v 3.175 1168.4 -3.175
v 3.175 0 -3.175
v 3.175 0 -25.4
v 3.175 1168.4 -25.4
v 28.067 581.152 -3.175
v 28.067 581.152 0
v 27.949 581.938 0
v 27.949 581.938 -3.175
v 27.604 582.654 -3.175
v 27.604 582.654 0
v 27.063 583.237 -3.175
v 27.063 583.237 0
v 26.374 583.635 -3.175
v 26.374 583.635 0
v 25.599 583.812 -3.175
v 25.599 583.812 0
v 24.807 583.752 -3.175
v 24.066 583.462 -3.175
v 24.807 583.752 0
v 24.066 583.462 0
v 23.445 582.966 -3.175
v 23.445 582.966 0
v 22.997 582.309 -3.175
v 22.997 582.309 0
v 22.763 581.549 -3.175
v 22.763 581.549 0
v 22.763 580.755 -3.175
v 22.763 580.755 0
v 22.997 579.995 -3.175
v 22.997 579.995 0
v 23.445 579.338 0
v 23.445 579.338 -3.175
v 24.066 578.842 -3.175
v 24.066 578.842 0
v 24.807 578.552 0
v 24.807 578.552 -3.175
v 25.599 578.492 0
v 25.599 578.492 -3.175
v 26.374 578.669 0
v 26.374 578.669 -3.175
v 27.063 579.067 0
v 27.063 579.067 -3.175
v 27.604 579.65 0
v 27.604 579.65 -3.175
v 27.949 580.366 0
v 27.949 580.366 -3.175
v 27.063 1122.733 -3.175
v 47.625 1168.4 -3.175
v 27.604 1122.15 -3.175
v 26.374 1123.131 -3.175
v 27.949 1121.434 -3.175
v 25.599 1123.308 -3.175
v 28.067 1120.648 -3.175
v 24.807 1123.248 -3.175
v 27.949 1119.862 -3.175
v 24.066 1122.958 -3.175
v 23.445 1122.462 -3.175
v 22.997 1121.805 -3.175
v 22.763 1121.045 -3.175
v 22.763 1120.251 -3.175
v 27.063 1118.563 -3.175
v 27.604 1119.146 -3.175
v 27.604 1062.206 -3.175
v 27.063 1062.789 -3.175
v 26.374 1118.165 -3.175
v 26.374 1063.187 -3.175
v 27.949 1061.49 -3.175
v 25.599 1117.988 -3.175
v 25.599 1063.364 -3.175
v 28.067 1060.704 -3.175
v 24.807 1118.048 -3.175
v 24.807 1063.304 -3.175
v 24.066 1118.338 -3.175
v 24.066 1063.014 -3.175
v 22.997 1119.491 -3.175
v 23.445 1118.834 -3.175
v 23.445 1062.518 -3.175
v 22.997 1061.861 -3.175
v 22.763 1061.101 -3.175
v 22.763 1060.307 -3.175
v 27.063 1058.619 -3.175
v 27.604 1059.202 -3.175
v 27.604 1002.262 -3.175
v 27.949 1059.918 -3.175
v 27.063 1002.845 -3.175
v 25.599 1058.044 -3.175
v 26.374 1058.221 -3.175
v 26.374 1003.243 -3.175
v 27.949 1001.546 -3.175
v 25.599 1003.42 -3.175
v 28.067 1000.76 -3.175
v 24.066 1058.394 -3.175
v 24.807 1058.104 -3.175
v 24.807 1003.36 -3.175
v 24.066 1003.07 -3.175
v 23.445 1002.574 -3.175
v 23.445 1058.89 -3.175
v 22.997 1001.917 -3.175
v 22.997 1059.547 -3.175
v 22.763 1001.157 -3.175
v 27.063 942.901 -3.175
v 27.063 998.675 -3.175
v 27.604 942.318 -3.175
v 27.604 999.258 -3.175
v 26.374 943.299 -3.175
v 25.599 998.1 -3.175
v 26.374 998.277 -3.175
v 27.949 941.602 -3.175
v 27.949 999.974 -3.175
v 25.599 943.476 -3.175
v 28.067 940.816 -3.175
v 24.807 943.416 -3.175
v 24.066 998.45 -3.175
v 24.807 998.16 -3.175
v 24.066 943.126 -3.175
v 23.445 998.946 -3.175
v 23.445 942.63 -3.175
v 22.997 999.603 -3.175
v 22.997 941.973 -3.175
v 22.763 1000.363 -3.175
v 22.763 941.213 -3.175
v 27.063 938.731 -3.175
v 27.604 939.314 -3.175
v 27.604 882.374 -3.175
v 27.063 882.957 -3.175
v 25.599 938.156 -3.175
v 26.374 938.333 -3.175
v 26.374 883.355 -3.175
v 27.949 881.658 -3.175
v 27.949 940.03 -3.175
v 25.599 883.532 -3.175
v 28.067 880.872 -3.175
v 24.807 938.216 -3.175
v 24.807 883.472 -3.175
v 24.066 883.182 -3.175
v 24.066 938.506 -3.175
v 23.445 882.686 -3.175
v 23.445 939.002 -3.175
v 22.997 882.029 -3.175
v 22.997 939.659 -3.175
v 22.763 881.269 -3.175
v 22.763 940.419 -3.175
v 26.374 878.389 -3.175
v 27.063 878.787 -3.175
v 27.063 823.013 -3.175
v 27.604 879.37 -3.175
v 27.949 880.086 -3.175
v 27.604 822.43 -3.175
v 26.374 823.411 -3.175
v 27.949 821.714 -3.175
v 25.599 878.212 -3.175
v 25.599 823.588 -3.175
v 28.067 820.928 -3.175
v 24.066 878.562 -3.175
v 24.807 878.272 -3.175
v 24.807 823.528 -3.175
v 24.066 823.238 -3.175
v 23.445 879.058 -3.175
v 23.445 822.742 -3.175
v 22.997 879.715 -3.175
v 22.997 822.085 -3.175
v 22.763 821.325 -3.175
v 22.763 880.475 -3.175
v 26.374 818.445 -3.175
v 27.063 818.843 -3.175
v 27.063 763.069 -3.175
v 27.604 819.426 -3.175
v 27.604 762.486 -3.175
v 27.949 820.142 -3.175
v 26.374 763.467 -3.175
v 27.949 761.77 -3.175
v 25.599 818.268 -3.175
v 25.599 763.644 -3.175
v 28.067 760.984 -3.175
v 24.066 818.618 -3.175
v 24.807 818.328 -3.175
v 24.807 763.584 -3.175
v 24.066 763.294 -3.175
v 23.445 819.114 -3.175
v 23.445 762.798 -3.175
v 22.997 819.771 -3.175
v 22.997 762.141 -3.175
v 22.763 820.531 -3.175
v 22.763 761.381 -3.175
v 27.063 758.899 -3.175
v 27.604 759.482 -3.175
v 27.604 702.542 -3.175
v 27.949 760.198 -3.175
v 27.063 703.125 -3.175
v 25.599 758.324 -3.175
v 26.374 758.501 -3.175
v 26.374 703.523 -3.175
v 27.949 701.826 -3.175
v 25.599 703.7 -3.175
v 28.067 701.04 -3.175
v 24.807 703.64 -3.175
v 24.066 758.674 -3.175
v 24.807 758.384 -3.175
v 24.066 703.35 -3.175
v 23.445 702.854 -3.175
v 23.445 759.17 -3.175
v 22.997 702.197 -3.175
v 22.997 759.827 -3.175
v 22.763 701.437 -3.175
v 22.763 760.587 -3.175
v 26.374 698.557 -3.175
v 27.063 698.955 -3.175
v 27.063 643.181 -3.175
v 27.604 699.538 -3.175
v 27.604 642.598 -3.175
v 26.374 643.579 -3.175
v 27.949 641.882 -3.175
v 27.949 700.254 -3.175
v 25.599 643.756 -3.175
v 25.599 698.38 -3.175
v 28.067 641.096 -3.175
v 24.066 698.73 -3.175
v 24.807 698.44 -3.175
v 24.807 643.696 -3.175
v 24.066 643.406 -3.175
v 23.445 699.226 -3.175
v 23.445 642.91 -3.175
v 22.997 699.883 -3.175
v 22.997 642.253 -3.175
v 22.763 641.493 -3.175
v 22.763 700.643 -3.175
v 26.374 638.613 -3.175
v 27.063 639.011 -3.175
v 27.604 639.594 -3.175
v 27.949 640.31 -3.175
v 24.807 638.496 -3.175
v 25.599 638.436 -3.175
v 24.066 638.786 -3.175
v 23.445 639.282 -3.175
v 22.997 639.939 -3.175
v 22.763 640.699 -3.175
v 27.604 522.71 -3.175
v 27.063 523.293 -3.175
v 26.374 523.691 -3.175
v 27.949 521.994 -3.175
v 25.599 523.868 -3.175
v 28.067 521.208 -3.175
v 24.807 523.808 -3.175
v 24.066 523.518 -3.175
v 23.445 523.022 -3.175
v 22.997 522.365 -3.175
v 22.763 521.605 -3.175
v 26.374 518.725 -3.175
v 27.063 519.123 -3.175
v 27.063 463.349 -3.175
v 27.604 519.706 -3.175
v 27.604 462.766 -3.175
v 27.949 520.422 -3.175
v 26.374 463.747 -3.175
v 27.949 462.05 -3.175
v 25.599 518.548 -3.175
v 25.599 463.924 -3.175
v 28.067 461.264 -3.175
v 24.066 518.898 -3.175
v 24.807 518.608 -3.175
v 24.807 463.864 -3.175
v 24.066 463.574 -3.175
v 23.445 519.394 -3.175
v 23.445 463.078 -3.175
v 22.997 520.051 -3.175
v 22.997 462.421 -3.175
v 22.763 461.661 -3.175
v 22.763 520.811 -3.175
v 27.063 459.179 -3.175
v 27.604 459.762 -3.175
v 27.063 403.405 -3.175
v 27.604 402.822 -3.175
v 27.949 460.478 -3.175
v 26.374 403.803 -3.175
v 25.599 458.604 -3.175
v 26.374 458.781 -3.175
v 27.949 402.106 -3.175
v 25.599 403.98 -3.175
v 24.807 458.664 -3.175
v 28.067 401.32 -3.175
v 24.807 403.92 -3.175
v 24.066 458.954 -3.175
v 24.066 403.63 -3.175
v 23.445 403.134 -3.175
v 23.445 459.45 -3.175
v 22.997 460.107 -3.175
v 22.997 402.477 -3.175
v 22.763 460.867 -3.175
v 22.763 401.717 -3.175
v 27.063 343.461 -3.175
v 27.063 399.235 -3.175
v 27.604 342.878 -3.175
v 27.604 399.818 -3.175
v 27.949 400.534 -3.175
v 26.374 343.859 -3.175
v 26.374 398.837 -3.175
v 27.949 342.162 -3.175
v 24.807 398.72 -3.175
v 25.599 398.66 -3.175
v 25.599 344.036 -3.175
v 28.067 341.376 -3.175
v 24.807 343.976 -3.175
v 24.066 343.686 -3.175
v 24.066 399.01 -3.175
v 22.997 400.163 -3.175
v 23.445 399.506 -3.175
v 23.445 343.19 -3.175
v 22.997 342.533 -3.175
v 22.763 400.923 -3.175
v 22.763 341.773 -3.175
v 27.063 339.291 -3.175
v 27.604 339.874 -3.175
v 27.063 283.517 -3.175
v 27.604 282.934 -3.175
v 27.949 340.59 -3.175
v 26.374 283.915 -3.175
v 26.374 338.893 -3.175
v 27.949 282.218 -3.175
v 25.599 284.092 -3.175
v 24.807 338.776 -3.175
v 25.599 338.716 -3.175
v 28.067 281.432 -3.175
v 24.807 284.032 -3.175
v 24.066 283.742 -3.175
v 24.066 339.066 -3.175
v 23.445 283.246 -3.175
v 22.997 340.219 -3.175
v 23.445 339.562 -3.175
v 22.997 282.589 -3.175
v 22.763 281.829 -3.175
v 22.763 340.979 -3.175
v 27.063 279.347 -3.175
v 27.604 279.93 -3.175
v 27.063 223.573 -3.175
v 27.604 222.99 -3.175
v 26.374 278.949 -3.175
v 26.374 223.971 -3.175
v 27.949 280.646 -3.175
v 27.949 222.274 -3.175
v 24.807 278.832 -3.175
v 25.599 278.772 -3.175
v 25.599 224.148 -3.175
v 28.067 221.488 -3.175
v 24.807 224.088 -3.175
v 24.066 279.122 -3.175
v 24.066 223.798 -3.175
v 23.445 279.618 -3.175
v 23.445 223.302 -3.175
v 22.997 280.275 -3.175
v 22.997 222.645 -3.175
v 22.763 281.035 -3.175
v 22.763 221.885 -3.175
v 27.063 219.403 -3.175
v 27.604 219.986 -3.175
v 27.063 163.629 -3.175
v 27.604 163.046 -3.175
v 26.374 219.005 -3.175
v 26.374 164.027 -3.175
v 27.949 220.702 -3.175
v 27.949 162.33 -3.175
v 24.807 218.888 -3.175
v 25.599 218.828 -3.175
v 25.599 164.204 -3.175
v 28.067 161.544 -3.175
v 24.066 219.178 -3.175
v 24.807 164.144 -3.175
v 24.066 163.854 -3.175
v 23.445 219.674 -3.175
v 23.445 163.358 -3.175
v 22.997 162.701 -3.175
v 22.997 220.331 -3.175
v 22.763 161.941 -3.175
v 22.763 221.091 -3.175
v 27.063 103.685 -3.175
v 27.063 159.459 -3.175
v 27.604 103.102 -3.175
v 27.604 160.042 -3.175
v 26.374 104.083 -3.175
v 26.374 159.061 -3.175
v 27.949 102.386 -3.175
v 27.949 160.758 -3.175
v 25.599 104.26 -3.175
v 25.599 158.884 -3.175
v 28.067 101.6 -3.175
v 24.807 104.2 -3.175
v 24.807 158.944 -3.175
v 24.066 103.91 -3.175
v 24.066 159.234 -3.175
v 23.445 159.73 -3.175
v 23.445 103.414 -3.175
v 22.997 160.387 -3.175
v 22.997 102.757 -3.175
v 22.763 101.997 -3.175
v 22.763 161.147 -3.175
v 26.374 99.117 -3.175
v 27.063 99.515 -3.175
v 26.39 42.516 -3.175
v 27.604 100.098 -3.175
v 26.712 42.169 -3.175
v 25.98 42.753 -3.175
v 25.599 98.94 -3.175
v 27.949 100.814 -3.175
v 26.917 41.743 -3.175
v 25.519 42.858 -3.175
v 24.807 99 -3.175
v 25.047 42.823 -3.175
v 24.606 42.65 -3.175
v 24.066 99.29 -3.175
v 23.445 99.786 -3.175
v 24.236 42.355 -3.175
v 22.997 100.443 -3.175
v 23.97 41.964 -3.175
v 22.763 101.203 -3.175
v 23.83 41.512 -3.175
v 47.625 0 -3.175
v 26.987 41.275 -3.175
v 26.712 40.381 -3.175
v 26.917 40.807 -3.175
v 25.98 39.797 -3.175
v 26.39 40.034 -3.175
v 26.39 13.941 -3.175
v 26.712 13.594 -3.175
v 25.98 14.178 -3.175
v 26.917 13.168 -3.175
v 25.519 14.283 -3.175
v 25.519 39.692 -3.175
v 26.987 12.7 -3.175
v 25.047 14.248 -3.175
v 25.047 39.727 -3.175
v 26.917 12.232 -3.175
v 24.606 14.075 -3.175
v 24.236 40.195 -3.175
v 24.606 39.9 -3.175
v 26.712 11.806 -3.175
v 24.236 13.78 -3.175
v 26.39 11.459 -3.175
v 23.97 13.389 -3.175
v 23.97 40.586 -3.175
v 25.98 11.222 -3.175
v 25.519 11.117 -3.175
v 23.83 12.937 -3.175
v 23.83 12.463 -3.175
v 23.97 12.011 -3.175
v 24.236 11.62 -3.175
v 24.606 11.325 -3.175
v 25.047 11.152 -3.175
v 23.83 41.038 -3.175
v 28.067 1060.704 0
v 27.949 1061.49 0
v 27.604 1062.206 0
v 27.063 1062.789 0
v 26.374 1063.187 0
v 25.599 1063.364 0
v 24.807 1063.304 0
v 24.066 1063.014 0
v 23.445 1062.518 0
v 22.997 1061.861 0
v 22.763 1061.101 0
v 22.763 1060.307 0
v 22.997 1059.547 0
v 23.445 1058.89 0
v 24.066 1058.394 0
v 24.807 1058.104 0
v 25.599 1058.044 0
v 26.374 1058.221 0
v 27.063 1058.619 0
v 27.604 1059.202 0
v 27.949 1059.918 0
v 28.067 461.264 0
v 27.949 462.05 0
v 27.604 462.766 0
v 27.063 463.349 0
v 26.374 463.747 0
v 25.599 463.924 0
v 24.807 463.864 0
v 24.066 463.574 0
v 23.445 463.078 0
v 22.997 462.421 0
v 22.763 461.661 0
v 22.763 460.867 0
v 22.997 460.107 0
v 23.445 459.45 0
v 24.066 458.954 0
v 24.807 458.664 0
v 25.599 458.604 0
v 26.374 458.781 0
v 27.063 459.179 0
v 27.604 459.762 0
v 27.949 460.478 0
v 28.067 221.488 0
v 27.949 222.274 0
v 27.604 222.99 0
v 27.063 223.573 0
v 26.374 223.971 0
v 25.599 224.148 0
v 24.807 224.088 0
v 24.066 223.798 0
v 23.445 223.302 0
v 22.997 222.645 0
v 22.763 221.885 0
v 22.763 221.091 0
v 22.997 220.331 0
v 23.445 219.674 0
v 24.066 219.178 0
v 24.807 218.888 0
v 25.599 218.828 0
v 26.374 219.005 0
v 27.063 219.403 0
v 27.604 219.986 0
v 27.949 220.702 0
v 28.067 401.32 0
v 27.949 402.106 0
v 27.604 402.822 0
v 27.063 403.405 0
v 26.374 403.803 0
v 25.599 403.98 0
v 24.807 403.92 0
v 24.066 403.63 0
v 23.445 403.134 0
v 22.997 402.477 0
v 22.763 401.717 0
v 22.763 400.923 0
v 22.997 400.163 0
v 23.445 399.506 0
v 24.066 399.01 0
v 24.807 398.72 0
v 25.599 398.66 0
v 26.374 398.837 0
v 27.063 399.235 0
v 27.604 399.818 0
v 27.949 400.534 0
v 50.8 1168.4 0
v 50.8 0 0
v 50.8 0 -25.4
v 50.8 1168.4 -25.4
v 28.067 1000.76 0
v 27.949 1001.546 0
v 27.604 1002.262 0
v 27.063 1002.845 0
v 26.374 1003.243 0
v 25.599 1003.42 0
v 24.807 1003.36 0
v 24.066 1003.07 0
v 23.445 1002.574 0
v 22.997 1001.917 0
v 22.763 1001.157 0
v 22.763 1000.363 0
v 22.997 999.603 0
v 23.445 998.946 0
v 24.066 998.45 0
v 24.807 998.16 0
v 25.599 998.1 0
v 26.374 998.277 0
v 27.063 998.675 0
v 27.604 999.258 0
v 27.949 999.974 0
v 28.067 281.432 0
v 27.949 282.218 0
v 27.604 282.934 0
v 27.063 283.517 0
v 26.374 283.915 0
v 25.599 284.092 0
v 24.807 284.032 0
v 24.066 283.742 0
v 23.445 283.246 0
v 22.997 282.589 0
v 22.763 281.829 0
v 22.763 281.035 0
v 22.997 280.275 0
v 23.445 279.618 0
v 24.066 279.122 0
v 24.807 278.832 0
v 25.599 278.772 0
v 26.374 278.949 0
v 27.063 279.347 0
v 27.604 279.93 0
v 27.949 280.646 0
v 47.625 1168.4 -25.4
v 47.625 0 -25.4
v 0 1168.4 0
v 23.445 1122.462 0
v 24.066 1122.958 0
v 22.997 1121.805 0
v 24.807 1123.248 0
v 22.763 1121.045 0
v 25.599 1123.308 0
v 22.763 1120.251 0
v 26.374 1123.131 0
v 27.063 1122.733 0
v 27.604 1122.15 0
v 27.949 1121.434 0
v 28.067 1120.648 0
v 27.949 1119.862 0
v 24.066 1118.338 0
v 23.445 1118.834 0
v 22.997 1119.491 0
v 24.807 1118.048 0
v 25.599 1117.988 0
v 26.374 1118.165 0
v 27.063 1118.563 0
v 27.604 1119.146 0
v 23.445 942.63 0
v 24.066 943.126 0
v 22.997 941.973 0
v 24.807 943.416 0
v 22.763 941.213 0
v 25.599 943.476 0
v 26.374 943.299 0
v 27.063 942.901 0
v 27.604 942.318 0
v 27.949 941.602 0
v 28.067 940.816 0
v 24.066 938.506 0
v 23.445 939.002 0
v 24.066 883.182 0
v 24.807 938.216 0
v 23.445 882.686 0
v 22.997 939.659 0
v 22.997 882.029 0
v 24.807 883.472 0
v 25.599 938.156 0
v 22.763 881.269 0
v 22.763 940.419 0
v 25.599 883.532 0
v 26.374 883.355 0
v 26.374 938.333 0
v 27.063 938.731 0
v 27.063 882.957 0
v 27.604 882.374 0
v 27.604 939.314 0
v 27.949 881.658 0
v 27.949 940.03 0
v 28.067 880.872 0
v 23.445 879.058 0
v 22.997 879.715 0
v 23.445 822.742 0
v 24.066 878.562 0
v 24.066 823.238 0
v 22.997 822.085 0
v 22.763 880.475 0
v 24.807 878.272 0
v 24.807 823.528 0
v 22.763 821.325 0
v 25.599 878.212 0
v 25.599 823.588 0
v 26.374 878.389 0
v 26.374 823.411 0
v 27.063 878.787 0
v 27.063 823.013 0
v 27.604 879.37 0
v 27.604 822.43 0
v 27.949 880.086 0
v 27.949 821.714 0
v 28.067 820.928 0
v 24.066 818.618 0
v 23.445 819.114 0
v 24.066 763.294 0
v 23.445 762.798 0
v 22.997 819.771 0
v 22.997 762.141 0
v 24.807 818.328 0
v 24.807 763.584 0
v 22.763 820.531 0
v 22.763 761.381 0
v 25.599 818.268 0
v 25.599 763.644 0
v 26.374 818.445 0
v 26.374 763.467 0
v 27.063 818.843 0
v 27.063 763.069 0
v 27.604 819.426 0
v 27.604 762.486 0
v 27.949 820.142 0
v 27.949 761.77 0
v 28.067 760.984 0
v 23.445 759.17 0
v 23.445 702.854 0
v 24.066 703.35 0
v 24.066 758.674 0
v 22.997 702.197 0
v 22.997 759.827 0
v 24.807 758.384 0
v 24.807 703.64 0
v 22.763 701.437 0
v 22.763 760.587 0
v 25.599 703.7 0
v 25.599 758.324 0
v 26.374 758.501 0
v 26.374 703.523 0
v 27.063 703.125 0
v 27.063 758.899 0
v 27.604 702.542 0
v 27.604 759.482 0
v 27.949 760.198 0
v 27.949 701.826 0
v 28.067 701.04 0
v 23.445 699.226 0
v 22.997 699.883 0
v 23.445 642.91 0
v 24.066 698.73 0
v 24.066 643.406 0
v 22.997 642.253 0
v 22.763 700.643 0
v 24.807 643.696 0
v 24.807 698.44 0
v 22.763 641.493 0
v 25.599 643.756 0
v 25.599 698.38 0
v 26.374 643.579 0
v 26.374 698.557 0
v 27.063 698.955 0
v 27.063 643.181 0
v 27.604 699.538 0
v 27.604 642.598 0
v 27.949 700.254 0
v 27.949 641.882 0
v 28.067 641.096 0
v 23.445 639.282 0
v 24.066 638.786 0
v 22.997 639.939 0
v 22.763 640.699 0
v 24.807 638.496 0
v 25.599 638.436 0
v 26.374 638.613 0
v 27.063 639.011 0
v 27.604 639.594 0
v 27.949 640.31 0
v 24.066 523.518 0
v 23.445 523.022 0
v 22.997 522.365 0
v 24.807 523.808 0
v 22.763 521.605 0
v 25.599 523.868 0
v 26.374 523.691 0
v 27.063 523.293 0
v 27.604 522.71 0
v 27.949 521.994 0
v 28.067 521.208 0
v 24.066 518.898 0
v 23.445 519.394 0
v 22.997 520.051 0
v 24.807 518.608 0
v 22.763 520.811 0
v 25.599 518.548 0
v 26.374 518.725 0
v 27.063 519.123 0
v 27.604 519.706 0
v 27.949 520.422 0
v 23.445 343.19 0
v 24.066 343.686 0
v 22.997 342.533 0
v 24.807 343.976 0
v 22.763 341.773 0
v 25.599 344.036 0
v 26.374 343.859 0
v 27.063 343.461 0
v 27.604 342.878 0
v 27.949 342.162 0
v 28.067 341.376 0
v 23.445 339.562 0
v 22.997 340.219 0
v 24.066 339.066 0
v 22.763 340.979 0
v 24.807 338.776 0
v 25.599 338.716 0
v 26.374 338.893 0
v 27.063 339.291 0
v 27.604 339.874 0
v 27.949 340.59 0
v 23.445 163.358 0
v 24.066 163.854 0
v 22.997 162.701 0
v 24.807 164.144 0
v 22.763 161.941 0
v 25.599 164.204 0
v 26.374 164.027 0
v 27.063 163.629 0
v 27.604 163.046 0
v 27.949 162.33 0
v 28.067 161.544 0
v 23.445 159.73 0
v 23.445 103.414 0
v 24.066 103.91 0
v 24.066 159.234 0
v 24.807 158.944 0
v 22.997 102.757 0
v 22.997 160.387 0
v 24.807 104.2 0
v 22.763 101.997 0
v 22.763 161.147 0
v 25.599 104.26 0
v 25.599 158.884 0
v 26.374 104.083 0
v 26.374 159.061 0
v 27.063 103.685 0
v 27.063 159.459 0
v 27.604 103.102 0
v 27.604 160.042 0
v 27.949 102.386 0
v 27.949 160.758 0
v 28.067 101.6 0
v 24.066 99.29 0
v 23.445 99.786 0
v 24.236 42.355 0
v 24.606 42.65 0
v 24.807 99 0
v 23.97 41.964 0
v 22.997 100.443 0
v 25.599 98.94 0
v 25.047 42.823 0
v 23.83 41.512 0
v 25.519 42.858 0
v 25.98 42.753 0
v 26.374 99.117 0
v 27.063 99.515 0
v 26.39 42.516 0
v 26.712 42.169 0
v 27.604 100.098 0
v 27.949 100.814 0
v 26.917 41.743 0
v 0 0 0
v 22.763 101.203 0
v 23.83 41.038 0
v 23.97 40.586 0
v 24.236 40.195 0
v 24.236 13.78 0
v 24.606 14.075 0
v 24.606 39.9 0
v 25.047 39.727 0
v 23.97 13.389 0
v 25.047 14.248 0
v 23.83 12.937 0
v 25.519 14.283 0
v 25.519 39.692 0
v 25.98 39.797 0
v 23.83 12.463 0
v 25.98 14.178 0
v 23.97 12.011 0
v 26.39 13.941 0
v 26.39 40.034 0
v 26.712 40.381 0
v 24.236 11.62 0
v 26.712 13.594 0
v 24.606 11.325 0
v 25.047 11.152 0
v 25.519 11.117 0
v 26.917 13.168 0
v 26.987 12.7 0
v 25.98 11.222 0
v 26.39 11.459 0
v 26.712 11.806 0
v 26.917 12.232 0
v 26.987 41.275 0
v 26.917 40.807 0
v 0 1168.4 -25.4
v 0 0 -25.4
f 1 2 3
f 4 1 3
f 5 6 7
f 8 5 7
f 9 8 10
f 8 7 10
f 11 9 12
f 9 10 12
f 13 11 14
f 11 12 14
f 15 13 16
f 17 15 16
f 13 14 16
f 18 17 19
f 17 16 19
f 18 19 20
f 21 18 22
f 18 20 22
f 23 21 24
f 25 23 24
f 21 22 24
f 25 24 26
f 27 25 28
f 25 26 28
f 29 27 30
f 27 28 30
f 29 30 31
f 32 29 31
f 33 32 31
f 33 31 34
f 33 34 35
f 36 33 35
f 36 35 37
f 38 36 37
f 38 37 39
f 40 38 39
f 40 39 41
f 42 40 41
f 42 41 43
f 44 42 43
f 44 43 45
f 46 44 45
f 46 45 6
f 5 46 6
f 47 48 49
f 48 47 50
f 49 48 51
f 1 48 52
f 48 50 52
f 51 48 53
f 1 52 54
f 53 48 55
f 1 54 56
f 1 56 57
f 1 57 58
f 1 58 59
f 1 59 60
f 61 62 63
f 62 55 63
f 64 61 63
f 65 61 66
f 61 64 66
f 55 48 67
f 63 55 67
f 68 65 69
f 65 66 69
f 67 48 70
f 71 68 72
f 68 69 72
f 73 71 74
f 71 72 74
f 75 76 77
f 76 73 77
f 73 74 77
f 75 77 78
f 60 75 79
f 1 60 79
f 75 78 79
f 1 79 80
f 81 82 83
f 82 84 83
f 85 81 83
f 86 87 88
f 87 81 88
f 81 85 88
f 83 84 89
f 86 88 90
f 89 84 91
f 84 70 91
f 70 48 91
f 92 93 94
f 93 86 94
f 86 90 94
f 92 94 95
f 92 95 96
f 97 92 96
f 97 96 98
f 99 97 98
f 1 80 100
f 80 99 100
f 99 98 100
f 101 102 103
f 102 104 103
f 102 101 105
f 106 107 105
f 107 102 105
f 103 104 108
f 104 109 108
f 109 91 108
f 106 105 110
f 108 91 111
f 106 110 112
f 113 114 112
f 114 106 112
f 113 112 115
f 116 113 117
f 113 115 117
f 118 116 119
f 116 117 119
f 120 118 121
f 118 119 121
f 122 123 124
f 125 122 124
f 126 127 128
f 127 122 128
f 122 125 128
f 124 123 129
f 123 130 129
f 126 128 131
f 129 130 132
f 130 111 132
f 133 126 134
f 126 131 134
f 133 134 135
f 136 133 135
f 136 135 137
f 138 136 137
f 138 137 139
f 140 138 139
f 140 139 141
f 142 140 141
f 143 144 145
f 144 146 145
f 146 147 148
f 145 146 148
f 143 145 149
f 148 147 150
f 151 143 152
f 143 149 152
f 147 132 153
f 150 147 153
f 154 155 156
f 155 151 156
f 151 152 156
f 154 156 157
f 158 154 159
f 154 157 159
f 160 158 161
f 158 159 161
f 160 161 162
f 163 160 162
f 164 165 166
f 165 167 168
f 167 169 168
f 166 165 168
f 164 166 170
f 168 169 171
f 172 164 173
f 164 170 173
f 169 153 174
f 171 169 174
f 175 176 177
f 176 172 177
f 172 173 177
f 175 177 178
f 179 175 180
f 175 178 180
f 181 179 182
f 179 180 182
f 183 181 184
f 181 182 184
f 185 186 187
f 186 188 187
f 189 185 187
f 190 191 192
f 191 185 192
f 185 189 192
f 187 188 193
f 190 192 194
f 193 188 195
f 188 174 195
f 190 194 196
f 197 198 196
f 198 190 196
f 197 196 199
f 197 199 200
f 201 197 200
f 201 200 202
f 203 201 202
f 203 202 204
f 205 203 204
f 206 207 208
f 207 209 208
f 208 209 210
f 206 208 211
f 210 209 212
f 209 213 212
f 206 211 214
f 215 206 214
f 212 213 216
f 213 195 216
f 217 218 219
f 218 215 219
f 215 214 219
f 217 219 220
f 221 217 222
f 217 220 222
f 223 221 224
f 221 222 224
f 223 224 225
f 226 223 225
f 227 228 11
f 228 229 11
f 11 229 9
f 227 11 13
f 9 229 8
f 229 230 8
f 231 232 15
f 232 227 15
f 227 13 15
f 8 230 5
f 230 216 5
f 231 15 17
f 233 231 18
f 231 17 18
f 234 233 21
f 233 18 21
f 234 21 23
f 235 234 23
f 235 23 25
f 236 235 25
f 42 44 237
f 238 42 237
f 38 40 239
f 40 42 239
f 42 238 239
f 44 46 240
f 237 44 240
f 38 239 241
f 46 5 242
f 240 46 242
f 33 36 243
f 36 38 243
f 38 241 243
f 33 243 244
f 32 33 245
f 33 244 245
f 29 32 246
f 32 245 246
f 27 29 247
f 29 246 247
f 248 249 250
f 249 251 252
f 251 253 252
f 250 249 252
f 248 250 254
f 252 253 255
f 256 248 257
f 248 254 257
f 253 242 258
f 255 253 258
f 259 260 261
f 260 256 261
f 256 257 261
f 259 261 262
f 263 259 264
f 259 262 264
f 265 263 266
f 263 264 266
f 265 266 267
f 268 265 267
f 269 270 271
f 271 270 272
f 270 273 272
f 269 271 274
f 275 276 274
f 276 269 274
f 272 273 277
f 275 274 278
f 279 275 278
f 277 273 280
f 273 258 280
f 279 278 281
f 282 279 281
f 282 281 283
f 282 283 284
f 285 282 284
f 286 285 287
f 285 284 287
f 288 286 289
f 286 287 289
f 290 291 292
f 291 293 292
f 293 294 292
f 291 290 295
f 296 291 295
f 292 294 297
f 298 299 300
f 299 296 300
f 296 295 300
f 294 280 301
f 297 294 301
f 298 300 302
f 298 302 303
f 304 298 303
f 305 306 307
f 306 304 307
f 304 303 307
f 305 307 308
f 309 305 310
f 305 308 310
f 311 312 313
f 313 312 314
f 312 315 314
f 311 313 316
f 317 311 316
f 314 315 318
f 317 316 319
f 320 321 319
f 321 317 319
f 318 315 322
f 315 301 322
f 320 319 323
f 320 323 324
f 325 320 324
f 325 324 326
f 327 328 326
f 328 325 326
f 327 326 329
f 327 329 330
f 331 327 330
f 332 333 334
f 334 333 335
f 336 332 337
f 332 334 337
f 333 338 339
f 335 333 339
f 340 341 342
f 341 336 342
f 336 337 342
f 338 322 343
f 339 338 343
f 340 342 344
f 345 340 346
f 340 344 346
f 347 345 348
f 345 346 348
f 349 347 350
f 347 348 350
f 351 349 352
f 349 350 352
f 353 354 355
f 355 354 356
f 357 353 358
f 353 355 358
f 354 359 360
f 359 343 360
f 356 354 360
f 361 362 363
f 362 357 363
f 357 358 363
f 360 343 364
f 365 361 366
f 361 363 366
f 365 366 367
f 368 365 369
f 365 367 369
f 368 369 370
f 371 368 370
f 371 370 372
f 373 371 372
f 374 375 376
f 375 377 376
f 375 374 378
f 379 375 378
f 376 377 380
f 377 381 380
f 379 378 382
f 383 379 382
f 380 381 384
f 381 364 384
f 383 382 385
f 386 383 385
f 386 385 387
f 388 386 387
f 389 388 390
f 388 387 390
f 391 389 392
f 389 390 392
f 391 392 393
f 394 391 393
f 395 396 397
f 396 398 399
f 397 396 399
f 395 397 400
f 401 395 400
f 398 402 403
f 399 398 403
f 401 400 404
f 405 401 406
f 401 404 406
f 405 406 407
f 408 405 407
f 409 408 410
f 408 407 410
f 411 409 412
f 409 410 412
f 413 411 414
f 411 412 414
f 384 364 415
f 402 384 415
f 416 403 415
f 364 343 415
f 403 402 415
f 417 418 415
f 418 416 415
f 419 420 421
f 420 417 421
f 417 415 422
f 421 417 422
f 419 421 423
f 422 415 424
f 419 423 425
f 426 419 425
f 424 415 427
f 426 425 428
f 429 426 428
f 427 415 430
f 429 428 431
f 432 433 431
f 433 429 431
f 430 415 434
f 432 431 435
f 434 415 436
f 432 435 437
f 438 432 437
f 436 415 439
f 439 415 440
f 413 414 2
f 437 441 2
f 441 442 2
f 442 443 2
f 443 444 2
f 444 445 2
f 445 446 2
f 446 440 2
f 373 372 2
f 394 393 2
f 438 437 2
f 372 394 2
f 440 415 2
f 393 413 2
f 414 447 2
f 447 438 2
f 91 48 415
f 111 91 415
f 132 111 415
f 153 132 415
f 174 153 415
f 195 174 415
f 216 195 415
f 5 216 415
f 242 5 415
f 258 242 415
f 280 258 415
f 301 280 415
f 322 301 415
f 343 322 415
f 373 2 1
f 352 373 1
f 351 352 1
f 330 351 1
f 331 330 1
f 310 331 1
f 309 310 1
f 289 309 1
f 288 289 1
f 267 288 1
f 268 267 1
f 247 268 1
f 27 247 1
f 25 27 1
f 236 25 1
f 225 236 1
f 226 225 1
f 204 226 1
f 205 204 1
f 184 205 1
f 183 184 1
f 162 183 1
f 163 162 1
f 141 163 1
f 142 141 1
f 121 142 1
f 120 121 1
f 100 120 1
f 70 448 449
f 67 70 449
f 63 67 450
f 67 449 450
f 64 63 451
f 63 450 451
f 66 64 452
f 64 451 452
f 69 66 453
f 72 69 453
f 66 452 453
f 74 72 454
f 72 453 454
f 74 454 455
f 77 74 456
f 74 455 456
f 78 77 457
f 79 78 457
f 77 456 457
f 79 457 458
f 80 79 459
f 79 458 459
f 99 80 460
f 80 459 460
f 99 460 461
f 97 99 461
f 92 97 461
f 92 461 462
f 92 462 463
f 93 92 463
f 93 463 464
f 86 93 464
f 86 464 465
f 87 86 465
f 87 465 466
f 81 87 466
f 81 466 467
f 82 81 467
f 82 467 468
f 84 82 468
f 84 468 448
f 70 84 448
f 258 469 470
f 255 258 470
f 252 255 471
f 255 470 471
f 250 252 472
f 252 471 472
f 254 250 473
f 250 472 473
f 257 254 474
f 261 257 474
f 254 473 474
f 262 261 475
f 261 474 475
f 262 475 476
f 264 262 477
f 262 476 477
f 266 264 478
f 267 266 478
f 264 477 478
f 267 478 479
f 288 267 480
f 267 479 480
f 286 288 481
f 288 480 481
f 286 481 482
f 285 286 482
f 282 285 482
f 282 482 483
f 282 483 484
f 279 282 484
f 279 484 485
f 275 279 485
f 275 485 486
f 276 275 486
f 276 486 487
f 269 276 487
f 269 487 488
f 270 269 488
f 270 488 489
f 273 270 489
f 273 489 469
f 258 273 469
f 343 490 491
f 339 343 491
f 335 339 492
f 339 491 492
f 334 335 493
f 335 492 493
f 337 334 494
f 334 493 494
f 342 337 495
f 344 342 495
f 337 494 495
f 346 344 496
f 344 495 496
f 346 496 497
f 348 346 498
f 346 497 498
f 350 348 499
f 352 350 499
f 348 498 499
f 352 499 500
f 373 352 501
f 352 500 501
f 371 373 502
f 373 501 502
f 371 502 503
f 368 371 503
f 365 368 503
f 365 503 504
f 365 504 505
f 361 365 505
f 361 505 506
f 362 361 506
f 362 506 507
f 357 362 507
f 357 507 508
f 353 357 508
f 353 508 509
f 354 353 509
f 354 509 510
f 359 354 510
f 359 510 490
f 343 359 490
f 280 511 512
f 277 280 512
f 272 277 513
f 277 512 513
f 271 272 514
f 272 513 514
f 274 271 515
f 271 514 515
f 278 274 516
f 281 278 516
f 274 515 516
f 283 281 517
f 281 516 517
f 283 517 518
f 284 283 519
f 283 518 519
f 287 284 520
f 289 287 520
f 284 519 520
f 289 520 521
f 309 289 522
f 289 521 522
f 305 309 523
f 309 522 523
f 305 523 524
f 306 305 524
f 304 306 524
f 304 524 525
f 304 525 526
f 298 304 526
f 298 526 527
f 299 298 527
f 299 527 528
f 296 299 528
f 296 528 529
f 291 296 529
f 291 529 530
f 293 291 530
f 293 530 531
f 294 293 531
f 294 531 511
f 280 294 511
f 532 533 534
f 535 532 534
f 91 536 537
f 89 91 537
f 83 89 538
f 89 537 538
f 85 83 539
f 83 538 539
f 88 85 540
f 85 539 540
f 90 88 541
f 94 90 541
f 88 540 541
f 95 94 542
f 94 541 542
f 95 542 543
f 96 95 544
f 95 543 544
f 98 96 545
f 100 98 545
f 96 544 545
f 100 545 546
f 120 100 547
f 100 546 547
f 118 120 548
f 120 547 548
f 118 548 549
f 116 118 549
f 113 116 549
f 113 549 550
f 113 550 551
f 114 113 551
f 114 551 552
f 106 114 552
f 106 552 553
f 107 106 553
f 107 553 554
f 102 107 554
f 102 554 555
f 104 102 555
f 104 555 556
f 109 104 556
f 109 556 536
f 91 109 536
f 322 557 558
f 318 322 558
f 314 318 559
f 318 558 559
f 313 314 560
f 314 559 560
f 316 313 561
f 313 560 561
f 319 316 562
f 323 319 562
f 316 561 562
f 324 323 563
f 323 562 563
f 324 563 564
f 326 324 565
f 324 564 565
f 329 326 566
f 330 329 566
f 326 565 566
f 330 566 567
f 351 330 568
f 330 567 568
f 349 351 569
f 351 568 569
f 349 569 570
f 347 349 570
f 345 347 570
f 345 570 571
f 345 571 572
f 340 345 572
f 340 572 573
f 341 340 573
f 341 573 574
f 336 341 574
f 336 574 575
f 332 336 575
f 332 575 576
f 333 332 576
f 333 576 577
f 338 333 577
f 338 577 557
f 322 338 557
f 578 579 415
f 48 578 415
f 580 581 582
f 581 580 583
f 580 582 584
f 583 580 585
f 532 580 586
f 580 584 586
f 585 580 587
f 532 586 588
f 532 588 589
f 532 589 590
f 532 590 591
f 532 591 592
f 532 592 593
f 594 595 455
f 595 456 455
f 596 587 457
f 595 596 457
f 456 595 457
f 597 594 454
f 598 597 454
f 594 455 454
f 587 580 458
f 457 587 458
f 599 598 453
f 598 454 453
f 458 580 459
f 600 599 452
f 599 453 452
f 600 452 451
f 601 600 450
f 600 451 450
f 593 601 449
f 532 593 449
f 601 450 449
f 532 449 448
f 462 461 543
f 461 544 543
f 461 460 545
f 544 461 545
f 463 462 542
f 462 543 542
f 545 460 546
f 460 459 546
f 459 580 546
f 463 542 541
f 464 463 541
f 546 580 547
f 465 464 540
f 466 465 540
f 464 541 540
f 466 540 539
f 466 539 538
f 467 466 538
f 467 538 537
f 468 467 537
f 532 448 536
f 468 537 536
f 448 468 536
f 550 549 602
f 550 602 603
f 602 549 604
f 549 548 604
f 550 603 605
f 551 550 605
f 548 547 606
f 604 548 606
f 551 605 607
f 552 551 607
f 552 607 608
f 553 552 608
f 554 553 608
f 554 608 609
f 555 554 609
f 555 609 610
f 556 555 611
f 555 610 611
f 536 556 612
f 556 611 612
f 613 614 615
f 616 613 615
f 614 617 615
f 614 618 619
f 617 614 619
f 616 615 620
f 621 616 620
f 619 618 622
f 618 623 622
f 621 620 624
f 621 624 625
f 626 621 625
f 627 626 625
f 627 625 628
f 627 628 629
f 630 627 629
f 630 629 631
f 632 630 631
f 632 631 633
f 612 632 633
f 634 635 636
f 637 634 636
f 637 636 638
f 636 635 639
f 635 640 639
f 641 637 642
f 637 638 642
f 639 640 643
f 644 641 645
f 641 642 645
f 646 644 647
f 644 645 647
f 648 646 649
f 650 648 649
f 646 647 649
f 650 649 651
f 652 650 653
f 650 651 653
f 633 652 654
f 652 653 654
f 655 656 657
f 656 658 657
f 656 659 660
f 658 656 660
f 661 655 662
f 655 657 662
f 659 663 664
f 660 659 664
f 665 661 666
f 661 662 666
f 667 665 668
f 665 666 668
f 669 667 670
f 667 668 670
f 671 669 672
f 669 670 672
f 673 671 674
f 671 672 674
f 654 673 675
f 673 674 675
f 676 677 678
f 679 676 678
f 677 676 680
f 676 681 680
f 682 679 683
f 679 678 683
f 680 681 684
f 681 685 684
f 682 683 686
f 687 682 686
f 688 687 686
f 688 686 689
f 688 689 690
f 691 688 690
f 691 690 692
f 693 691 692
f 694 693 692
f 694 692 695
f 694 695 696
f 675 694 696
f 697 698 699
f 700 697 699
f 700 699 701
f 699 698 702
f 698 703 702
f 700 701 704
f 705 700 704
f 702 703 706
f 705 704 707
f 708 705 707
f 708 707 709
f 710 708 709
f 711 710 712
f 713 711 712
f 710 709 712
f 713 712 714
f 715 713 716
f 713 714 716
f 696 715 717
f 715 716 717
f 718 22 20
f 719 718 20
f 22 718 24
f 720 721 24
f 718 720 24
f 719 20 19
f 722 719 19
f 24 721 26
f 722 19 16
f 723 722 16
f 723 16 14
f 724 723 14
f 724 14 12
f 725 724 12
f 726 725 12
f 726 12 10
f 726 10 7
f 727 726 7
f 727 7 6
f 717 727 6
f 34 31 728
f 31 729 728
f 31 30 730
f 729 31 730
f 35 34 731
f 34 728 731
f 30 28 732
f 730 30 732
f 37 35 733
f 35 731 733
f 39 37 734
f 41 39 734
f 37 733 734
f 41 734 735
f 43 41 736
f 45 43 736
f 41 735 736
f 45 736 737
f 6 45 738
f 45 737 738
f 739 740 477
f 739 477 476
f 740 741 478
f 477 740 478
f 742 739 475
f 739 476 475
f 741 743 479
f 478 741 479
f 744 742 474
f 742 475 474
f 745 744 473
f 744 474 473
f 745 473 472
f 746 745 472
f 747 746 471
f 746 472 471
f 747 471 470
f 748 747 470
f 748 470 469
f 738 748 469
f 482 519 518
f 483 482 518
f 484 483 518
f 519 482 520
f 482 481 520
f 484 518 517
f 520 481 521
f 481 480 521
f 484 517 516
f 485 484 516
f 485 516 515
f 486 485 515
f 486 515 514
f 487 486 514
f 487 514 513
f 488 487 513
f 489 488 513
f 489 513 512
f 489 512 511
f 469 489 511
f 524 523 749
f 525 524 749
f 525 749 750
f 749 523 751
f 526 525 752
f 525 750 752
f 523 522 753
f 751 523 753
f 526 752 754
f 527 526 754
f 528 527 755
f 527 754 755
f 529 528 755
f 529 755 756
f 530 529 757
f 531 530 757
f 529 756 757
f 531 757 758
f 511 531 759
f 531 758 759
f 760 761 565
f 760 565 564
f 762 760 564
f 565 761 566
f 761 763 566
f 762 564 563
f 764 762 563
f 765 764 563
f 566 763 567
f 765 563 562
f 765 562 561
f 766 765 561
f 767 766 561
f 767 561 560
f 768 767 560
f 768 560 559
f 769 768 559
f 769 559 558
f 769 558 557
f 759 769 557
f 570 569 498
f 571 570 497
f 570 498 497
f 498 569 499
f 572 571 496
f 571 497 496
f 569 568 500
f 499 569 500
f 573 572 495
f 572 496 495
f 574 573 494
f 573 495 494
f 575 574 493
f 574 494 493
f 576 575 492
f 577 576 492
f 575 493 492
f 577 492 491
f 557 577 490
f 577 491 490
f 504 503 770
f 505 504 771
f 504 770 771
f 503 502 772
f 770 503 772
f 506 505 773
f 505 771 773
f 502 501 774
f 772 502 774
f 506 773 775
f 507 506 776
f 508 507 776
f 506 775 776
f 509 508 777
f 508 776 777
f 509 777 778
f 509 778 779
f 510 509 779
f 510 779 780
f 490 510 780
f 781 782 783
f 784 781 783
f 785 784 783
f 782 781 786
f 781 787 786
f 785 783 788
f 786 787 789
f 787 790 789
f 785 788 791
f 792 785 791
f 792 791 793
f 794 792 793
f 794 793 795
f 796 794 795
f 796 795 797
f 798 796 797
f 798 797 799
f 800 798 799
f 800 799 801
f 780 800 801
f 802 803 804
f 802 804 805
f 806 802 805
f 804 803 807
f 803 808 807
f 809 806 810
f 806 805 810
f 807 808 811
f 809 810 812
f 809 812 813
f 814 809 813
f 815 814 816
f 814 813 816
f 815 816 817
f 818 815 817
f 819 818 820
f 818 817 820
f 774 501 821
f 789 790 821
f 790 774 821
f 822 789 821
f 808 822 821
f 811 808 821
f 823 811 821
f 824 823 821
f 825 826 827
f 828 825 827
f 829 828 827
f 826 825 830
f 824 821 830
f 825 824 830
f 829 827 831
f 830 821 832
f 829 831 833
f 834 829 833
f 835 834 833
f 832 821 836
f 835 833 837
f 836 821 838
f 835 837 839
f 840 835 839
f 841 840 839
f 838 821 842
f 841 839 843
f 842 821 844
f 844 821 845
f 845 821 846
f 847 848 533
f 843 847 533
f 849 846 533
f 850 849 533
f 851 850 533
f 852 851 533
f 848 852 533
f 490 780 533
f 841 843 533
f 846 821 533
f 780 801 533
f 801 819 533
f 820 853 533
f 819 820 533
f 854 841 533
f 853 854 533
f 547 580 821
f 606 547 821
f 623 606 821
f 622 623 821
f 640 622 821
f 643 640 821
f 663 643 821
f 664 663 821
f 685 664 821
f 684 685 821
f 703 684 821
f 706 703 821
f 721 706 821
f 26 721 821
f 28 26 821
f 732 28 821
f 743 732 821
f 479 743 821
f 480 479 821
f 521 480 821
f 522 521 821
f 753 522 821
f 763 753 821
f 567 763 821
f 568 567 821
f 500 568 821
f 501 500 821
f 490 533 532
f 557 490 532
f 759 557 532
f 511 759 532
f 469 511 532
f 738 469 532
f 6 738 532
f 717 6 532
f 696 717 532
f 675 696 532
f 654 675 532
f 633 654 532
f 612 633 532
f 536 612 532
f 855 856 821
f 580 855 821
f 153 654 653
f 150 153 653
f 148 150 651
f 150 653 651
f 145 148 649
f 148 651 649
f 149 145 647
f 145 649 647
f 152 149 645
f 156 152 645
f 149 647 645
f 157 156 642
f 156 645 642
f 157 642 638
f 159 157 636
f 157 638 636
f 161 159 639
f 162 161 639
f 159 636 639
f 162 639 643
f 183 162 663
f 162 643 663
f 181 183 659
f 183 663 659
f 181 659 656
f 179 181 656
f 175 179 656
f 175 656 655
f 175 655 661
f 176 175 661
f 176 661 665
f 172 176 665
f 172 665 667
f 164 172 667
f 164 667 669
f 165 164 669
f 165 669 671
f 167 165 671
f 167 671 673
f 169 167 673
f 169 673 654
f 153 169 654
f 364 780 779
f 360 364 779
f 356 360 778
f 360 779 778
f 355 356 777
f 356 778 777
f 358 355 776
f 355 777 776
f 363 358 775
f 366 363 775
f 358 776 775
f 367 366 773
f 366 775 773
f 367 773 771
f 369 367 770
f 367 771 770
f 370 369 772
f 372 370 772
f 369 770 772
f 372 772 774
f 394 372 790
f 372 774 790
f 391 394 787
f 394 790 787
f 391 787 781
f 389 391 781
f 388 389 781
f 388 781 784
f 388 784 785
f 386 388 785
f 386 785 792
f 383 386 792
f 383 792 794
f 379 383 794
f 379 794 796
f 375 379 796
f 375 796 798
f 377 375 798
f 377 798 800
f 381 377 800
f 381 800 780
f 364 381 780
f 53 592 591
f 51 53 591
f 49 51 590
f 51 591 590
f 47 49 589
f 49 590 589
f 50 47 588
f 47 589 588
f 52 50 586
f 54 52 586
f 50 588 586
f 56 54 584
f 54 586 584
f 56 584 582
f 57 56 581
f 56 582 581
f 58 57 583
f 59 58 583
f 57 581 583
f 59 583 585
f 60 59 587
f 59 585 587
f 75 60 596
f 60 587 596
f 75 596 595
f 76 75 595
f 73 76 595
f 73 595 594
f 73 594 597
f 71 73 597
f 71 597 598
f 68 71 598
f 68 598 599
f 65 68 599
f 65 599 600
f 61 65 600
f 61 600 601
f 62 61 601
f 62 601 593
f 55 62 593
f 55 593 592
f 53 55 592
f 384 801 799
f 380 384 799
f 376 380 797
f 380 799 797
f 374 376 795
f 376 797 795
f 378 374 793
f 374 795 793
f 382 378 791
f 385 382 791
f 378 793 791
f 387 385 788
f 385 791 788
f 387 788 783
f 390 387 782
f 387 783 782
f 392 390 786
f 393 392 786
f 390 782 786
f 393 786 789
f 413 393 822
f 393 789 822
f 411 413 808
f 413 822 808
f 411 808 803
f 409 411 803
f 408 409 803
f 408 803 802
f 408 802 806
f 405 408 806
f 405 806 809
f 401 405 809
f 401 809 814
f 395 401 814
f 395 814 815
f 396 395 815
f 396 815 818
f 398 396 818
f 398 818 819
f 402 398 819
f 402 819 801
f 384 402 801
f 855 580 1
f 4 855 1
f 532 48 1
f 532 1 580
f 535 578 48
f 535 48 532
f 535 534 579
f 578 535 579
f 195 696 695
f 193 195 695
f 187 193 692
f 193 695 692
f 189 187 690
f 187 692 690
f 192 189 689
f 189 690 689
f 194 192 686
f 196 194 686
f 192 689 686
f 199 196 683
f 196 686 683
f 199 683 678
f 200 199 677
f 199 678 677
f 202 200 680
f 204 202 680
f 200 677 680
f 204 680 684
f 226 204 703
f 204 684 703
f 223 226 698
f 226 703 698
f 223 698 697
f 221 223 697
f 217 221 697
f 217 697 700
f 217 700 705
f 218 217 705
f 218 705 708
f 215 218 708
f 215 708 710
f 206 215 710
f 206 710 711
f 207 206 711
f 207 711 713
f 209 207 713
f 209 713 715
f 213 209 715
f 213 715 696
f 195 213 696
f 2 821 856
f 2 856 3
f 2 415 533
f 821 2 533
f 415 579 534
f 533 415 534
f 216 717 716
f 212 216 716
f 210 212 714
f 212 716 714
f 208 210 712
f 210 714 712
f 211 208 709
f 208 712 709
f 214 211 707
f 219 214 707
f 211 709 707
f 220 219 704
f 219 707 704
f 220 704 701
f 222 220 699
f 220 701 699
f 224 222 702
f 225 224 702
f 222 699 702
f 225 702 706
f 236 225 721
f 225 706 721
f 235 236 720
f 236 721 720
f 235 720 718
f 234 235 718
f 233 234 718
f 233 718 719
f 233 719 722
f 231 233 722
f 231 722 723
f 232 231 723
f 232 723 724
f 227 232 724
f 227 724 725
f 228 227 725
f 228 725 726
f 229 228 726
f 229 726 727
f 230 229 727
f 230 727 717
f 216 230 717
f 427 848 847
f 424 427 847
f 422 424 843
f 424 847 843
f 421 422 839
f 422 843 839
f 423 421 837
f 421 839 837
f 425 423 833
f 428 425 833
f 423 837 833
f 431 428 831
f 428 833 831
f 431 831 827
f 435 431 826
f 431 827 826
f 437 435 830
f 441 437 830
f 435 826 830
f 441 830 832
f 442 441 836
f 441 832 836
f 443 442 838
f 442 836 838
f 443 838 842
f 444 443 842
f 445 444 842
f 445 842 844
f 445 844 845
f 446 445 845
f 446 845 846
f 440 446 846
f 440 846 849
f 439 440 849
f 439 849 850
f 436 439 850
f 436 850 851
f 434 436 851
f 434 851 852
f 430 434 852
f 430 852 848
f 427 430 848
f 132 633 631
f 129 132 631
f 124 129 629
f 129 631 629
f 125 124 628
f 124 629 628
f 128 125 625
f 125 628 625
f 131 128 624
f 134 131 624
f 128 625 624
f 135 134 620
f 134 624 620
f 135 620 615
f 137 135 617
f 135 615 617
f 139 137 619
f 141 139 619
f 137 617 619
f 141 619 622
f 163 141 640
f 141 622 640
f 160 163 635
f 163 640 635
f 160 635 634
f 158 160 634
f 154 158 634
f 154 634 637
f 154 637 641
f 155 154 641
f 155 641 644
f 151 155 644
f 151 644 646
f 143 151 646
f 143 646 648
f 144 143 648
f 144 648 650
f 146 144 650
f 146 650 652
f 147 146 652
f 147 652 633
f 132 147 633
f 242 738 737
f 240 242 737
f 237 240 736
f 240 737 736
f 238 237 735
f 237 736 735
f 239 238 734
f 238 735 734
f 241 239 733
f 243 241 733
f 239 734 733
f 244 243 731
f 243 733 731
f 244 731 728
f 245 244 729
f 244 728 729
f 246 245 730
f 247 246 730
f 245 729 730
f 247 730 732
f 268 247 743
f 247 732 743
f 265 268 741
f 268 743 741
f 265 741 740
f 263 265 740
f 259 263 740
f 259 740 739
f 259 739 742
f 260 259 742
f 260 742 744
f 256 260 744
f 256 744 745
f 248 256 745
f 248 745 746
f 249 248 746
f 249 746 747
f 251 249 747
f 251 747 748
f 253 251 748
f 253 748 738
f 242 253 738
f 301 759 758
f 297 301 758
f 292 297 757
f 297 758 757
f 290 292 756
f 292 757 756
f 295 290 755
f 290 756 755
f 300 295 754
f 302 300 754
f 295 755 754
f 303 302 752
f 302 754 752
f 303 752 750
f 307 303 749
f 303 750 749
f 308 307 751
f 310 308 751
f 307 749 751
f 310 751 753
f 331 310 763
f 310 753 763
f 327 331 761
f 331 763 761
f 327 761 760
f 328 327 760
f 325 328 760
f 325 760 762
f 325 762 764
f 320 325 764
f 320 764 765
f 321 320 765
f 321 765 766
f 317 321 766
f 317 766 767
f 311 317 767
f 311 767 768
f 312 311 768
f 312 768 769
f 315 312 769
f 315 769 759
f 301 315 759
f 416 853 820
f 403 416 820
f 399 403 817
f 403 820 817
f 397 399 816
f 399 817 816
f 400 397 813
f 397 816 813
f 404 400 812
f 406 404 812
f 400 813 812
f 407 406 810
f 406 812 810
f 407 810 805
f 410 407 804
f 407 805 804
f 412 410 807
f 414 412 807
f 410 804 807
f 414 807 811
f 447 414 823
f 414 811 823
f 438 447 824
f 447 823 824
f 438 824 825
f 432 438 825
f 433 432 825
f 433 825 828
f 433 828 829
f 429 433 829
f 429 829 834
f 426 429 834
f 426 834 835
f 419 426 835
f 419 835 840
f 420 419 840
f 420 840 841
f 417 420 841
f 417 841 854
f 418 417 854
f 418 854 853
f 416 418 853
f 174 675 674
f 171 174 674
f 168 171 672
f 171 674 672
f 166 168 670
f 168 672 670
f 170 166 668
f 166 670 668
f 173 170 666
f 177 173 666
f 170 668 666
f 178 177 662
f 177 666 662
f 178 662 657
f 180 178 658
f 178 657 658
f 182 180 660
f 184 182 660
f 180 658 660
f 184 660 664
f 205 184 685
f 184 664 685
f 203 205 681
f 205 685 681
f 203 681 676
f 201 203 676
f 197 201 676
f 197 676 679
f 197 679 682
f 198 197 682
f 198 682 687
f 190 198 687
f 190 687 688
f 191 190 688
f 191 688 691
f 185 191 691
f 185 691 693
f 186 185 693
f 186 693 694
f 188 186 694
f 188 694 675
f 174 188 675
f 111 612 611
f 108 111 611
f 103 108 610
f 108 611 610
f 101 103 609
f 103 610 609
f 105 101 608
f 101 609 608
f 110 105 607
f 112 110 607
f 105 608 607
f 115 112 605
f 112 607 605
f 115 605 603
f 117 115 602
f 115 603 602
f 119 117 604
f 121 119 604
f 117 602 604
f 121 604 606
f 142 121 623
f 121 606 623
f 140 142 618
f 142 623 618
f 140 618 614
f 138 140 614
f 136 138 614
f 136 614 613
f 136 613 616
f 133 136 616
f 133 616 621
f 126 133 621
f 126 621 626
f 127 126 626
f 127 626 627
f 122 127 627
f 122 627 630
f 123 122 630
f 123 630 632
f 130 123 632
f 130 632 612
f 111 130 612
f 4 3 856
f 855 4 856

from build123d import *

# Parameters (mm, degrees)
BOSS_EXTRUDE1_DEPTH = 1168.4
CUT_EXTRUDE1_REACH  = 27.4
SKETCH2_R           = 2.667
CUT_EXTRUDE2_REACH  = 27.4
SKETCH4_R           = 1.5875


with BuildPart() as part:
    # Sketch1 → Boss-Extrude1 (new body)
    with BuildSketch(Plane(origin=(0, 0, 0), x_dir=(1, 0, 0), z_dir=(0, 1, 0))):
        Polygon((3.175, 3.175), (3.175, 25.4), (0, 25.4), (0, 0), (50.8, 0), (50.8, 25.4), (47.625, 25.4), (47.625, 3.175), align=None)
    extrude(amount=BOSS_EXTRUDE1_DEPTH)

    # Sketch2 → Cut-Extrude1 (cut, up to next)
    with BuildSketch(Plane.XY, mode=Mode.PRIVATE) as cut_extrude1_sk1:
        with Locations((25.4, 101.6)):
            Circle(SKETCH2_R)
    cut_extrude1_tool1 = extrude(cut_extrude1_sk1.sketch, amount=-CUT_EXTRUDE1_REACH, mode=Mode.PRIVATE) & part.part
    add(cut_extrude1_tool1.solids().sort_by_distance((25.4, 101.6, 0))[0], mode=Mode.SUBTRACT)
    # Sketch2 → Cut-Extrude1 (cut, up to next)
    with BuildSketch(Plane.XY, mode=Mode.PRIVATE) as cut_extrude1_sk2:
        with Locations((25.4, 161.544)):
            Circle(SKETCH2_R)
    cut_extrude1_tool2 = extrude(cut_extrude1_sk2.sketch, amount=-CUT_EXTRUDE1_REACH, mode=Mode.PRIVATE) & part.part
    add(cut_extrude1_tool2.solids().sort_by_distance((25.4, 161.544, 0))[0], mode=Mode.SUBTRACT)
    # Sketch2 → Cut-Extrude1 (cut, up to next)
    with BuildSketch(Plane.XY, mode=Mode.PRIVATE) as cut_extrude1_sk3:
        with Locations((25.4, 221.488)):
            Circle(SKETCH2_R)
    cut_extrude1_tool3 = extrude(cut_extrude1_sk3.sketch, amount=-CUT_EXTRUDE1_REACH, mode=Mode.PRIVATE) & part.part
    add(cut_extrude1_tool3.solids().sort_by_distance((25.4, 221.488, 0))[0], mode=Mode.SUBTRACT)
    # Sketch2 → Cut-Extrude1 (cut, up to next)
    with BuildSketch(Plane.XY, mode=Mode.PRIVATE) as cut_extrude1_sk4:
        with Locations((25.4, 281.432)):
            Circle(SKETCH2_R)
    cut_extrude1_tool4 = extrude(cut_extrude1_sk4.sketch, amount=-CUT_EXTRUDE1_REACH, mode=Mode.PRIVATE) & part.part
    add(cut_extrude1_tool4.solids().sort_by_distance((25.4, 281.432, 0))[0], mode=Mode.SUBTRACT)
    # Sketch2 → Cut-Extrude1 (cut, up to next)
    with BuildSketch(Plane.XY, mode=Mode.PRIVATE) as cut_extrude1_sk5:
        with Locations((25.4, 341.376)):
            Circle(SKETCH2_R)
    cut_extrude1_tool5 = extrude(cut_extrude1_sk5.sketch, amount=-CUT_EXTRUDE1_REACH, mode=Mode.PRIVATE) & part.part
    add(cut_extrude1_tool5.solids().sort_by_distance((25.4, 341.376, 0))[0], mode=Mode.SUBTRACT)
    # Sketch2 → Cut-Extrude1 (cut, up to next)
    with BuildSketch(Plane.XY, mode=Mode.PRIVATE) as cut_extrude1_sk6:
        with Locations((25.4, 401.32)):
            Circle(SKETCH2_R)
    cut_extrude1_tool6 = extrude(cut_extrude1_sk6.sketch, amount=-CUT_EXTRUDE1_REACH, mode=Mode.PRIVATE) & part.part
    add(cut_extrude1_tool6.solids().sort_by_distance((25.4, 401.32, 0))[0], mode=Mode.SUBTRACT)
    # Sketch2 → Cut-Extrude1 (cut, up to next)
    with BuildSketch(Plane.XY, mode=Mode.PRIVATE) as cut_extrude1_sk7:
        with Locations((25.4, 461.264)):
            Circle(SKETCH2_R)
    cut_extrude1_tool7 = extrude(cut_extrude1_sk7.sketch, amount=-CUT_EXTRUDE1_REACH, mode=Mode.PRIVATE) & part.part
    add(cut_extrude1_tool7.solids().sort_by_distance((25.4, 461.264, 0))[0], mode=Mode.SUBTRACT)
    # Sketch2 → Cut-Extrude1 (cut, up to next)
    with BuildSketch(Plane.XY, mode=Mode.PRIVATE) as cut_extrude1_sk8:
        with Locations((25.4, 521.208)):
            Circle(SKETCH2_R)
    cut_extrude1_tool8 = extrude(cut_extrude1_sk8.sketch, amount=-CUT_EXTRUDE1_REACH, mode=Mode.PRIVATE) & part.part
    add(cut_extrude1_tool8.solids().sort_by_distance((25.4, 521.208, 0))[0], mode=Mode.SUBTRACT)
    # Sketch2 → Cut-Extrude1 (cut, up to next)
    with BuildSketch(Plane.XY, mode=Mode.PRIVATE) as cut_extrude1_sk9:
        with Locations((25.4, 581.152)):
            Circle(SKETCH2_R)
    cut_extrude1_tool9 = extrude(cut_extrude1_sk9.sketch, amount=-CUT_EXTRUDE1_REACH, mode=Mode.PRIVATE) & part.part
    add(cut_extrude1_tool9.solids().sort_by_distance((25.4, 581.152, 0))[0], mode=Mode.SUBTRACT)
    # Sketch2 → Cut-Extrude1 (cut, up to next)
    with BuildSketch(Plane.XY, mode=Mode.PRIVATE) as cut_extrude1_sk10:
        with Locations((25.4, 641.096)):
            Circle(SKETCH2_R)
    cut_extrude1_tool10 = extrude(cut_extrude1_sk10.sketch, amount=-CUT_EXTRUDE1_REACH, mode=Mode.PRIVATE) & part.part
    add(cut_extrude1_tool10.solids().sort_by_distance((25.4, 641.096, 0))[0], mode=Mode.SUBTRACT)
    # Sketch2 → Cut-Extrude1 (cut, up to next)
    with BuildSketch(Plane.XY, mode=Mode.PRIVATE) as cut_extrude1_sk11:
        with Locations((25.4, 701.04)):
            Circle(SKETCH2_R)
    cut_extrude1_tool11 = extrude(cut_extrude1_sk11.sketch, amount=-CUT_EXTRUDE1_REACH, mode=Mode.PRIVATE) & part.part
    add(cut_extrude1_tool11.solids().sort_by_distance((25.4, 701.04, 0))[0], mode=Mode.SUBTRACT)
    # Sketch2 → Cut-Extrude1 (cut, up to next)
    with BuildSketch(Plane.XY, mode=Mode.PRIVATE) as cut_extrude1_sk12:
        with Locations((25.4, 760.984)):
            Circle(SKETCH2_R)
    cut_extrude1_tool12 = extrude(cut_extrude1_sk12.sketch, amount=-CUT_EXTRUDE1_REACH, mode=Mode.PRIVATE) & part.part
    add(cut_extrude1_tool12.solids().sort_by_distance((25.4, 760.984, 0))[0], mode=Mode.SUBTRACT)
    # Sketch2 → Cut-Extrude1 (cut, up to next)
    with BuildSketch(Plane.XY, mode=Mode.PRIVATE) as cut_extrude1_sk13:
        with Locations((25.4, 820.928)):
            Circle(SKETCH2_R)
    cut_extrude1_tool13 = extrude(cut_extrude1_sk13.sketch, amount=-CUT_EXTRUDE1_REACH, mode=Mode.PRIVATE) & part.part
    add(cut_extrude1_tool13.solids().sort_by_distance((25.4, 820.928, 0))[0], mode=Mode.SUBTRACT)
    # Sketch2 → Cut-Extrude1 (cut, up to next)
    with BuildSketch(Plane.XY, mode=Mode.PRIVATE) as cut_extrude1_sk14:
        with Locations((25.4, 880.872)):
            Circle(SKETCH2_R)
    cut_extrude1_tool14 = extrude(cut_extrude1_sk14.sketch, amount=-CUT_EXTRUDE1_REACH, mode=Mode.PRIVATE) & part.part
    add(cut_extrude1_tool14.solids().sort_by_distance((25.4, 880.872, 0))[0], mode=Mode.SUBTRACT)
    # Sketch2 → Cut-Extrude1 (cut, up to next)
    with BuildSketch(Plane.XY, mode=Mode.PRIVATE) as cut_extrude1_sk15:
        with Locations((25.4, 940.816)):
            Circle(SKETCH2_R)
    cut_extrude1_tool15 = extrude(cut_extrude1_sk15.sketch, amount=-CUT_EXTRUDE1_REACH, mode=Mode.PRIVATE) & part.part
    add(cut_extrude1_tool15.solids().sort_by_distance((25.4, 940.816, 0))[0], mode=Mode.SUBTRACT)
    # Sketch2 → Cut-Extrude1 (cut, up to next)
    with BuildSketch(Plane.XY, mode=Mode.PRIVATE) as cut_extrude1_sk16:
        with Locations((25.4, 1000.76)):
            Circle(SKETCH2_R)
    cut_extrude1_tool16 = extrude(cut_extrude1_sk16.sketch, amount=-CUT_EXTRUDE1_REACH, mode=Mode.PRIVATE) & part.part
    add(cut_extrude1_tool16.solids().sort_by_distance((25.4, 1000.76, 0))[0], mode=Mode.SUBTRACT)
    # Sketch2 → Cut-Extrude1 (cut, up to next)
    with BuildSketch(Plane.XY, mode=Mode.PRIVATE) as cut_extrude1_sk17:
        with Locations((25.4, 1060.704)):
            Circle(SKETCH2_R)
    cut_extrude1_tool17 = extrude(cut_extrude1_sk17.sketch, amount=-CUT_EXTRUDE1_REACH, mode=Mode.PRIVATE) & part.part
    add(cut_extrude1_tool17.solids().sort_by_distance((25.4, 1060.704, 0))[0], mode=Mode.SUBTRACT)
    # Sketch2 → Cut-Extrude1 (cut, up to next)
    with BuildSketch(Plane.XY, mode=Mode.PRIVATE) as cut_extrude1_sk18:
        with Locations((25.4, 1120.648)):
            Circle(SKETCH2_R)
    cut_extrude1_tool18 = extrude(cut_extrude1_sk18.sketch, amount=-CUT_EXTRUDE1_REACH, mode=Mode.PRIVATE) & part.part
    add(cut_extrude1_tool18.solids().sort_by_distance((25.4, 1120.648, 0))[0], mode=Mode.SUBTRACT)

    # Sketch4 → Cut-Extrude2 (cut, up to next)
    with BuildSketch(Plane.XY, mode=Mode.PRIVATE) as cut_extrude2_sk1:
        with Locations((25.4, 41.275)):
            Circle(SKETCH4_R)
    cut_extrude2_tool1 = extrude(cut_extrude2_sk1.sketch, amount=-CUT_EXTRUDE2_REACH, mode=Mode.PRIVATE) & part.part
    add(cut_extrude2_tool1.solids().sort_by_distance((25.4, 41.275, 0))[0], mode=Mode.SUBTRACT)
    # Sketch4 → Cut-Extrude2 (cut, up to next)
    with BuildSketch(Plane.XY, mode=Mode.PRIVATE) as cut_extrude2_sk2:
        with Locations((25.4, 12.7)):
            Circle(SKETCH4_R)
    cut_extrude2_tool2 = extrude(cut_extrude2_sk2.sketch, amount=-CUT_EXTRUDE2_REACH, mode=Mode.PRIVATE) & part.part
    add(cut_extrude2_tool2.solids().sort_by_distance((25.4, 12.7, 0))[0], mode=Mode.SUBTRACT)


solid = part.part
